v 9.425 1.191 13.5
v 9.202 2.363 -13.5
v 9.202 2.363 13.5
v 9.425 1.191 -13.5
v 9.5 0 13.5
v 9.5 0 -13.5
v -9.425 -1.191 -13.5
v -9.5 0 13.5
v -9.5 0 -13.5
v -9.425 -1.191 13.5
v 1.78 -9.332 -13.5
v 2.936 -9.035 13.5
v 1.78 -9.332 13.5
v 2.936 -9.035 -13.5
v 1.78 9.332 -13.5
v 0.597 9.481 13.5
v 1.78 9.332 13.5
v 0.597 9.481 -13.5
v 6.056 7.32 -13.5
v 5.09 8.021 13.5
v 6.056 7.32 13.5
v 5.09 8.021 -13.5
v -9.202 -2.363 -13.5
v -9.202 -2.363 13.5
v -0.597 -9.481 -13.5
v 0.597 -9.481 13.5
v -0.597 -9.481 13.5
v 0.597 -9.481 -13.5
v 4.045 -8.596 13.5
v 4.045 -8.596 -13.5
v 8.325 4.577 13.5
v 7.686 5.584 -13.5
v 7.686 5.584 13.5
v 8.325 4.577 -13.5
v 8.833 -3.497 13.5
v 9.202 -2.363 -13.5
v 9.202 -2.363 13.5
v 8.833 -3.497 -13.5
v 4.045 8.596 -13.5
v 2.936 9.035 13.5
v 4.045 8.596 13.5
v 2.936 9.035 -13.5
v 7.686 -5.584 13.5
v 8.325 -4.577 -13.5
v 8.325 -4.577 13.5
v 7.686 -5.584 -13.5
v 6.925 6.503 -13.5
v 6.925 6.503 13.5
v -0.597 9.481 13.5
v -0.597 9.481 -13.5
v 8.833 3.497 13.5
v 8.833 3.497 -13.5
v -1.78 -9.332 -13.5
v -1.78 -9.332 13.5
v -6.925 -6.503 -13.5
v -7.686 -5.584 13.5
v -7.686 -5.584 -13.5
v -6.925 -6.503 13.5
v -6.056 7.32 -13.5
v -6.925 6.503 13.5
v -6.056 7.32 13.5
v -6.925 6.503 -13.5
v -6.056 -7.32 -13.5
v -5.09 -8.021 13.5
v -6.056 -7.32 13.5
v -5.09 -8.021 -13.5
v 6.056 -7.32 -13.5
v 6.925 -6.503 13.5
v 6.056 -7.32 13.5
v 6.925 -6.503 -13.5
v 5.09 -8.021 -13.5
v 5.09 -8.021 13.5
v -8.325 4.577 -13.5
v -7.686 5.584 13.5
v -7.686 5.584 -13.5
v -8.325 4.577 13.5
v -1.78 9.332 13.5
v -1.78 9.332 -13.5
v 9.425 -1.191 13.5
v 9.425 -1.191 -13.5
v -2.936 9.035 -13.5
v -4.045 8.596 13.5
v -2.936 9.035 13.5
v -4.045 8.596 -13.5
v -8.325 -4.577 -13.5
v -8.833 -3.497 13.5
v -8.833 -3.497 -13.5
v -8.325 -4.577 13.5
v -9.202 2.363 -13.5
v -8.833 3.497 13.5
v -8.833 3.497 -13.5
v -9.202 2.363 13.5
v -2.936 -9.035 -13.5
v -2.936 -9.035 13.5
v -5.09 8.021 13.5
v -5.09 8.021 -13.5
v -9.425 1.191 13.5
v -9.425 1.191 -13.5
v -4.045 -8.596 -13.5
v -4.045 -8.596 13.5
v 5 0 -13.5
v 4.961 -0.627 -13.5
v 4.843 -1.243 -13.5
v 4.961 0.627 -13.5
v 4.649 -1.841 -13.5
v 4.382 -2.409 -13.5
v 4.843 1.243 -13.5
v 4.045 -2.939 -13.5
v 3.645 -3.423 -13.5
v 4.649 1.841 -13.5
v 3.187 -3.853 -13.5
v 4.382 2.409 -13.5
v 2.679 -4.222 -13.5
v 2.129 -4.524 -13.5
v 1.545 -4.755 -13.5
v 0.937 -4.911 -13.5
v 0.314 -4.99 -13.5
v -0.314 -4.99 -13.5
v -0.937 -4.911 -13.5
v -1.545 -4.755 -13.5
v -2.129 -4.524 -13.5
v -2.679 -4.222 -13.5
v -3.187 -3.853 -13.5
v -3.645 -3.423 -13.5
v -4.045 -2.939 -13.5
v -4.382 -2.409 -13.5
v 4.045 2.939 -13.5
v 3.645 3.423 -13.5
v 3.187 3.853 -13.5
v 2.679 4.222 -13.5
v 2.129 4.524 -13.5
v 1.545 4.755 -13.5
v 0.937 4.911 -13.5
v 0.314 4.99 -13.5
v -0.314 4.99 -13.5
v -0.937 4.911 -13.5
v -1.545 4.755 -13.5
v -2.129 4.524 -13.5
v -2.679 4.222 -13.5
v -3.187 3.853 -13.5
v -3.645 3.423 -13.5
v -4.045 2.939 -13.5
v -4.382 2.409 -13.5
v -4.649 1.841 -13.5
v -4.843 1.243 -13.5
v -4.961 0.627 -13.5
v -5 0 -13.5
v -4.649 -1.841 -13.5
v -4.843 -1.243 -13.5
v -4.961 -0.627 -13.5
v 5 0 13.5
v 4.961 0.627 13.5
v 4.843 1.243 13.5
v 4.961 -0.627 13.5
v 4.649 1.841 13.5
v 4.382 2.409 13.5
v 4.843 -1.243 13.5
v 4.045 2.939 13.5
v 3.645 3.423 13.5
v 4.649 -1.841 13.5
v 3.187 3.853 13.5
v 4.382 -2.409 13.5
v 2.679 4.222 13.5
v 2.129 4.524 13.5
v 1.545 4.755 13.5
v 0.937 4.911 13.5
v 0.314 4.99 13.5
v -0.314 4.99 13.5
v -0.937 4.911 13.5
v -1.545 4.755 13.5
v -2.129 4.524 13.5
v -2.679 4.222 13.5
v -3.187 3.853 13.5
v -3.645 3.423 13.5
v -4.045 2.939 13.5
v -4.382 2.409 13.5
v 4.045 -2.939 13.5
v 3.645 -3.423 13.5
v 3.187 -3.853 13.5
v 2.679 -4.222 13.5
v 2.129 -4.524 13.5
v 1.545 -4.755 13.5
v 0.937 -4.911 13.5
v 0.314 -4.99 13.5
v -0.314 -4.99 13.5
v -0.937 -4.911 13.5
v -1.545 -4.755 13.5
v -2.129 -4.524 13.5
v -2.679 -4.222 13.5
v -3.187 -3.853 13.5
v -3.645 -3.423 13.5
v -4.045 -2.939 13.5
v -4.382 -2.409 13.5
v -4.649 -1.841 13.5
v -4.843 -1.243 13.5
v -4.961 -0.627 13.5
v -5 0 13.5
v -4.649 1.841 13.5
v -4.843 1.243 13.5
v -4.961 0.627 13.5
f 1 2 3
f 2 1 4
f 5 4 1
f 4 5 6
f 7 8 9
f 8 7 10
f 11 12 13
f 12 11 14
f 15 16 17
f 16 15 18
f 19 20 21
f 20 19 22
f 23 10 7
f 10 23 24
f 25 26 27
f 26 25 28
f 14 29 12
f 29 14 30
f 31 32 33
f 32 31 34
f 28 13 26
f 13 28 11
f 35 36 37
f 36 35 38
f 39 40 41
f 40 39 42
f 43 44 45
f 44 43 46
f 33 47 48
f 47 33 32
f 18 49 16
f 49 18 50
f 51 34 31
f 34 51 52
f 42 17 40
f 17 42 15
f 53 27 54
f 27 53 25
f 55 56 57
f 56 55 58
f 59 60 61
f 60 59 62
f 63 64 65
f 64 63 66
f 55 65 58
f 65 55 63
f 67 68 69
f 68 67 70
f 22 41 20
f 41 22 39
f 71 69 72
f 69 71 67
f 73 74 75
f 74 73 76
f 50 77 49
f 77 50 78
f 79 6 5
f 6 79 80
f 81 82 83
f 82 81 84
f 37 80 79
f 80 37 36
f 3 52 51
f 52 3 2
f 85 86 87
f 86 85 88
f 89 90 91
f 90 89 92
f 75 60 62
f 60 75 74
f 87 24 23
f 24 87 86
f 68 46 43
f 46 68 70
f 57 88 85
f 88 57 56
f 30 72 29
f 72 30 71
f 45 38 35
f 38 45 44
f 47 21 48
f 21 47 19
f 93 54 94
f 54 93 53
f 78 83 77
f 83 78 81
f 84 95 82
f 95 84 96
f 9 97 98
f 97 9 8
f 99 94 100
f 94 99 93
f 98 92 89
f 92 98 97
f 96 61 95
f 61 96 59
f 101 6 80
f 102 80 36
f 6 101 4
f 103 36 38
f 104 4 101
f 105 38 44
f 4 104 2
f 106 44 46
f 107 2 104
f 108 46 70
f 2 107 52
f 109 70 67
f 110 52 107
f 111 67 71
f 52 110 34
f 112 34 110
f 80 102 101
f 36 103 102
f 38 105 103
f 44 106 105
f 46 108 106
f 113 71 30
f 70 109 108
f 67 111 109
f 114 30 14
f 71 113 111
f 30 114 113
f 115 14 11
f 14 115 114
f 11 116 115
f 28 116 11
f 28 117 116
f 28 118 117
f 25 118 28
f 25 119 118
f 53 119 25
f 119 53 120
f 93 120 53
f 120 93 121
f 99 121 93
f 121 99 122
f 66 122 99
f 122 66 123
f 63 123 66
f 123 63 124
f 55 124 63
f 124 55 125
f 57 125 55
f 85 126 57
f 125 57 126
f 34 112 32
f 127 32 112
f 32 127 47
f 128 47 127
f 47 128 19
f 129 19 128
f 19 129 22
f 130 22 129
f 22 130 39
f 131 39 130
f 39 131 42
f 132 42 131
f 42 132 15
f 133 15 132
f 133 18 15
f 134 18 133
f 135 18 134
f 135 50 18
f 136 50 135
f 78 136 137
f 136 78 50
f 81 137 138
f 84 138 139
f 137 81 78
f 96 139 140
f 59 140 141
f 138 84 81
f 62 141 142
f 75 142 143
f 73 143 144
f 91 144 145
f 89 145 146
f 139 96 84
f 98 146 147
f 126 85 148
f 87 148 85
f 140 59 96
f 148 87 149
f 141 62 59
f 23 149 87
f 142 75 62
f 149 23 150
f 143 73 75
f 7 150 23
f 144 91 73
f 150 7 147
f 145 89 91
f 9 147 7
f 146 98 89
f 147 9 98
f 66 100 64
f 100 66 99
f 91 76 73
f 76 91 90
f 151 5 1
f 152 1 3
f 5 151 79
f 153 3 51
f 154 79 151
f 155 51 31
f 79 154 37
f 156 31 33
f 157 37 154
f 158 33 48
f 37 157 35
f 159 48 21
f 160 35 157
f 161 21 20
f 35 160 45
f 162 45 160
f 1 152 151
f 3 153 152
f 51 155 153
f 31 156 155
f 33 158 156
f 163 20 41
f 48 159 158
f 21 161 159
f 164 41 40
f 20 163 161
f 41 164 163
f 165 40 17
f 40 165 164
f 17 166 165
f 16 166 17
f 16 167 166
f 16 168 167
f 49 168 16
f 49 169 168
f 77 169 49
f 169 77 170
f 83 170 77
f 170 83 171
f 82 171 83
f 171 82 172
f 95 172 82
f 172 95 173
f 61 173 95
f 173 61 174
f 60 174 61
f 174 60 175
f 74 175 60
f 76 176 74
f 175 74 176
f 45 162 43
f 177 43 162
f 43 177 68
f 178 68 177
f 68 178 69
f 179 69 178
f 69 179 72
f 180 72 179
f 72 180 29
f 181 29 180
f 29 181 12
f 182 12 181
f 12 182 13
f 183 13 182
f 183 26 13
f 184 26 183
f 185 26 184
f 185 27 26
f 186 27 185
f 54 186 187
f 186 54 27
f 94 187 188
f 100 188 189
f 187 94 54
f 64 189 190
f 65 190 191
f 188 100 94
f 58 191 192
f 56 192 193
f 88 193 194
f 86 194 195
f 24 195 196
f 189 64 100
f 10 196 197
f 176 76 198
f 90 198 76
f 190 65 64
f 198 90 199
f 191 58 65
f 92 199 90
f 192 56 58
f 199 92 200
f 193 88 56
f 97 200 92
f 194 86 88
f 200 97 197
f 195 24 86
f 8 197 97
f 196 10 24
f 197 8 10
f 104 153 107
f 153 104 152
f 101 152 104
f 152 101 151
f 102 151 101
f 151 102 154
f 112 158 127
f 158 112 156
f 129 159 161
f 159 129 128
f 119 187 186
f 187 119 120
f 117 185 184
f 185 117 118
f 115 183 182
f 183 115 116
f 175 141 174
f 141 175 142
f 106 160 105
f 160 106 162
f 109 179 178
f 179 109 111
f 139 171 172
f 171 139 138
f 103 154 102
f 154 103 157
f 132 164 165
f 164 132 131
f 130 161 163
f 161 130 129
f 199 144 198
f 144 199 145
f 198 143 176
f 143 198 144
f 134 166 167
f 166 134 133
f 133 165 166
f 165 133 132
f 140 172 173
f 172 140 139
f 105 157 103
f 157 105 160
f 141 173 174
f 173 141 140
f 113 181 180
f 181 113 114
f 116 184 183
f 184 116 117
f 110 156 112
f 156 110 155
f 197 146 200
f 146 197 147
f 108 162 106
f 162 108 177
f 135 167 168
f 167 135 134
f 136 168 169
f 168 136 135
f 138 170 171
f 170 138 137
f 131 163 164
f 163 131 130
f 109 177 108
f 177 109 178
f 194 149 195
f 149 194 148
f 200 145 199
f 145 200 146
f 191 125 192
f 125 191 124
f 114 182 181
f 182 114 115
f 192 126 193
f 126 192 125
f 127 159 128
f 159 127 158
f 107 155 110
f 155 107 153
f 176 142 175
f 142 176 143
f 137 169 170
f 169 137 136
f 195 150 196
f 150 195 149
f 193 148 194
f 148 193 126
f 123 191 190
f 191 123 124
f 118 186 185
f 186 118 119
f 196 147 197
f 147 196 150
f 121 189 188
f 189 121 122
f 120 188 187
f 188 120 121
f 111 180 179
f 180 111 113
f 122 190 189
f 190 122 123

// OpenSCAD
$fn = 50;


difference() {
	union() {
		translate(v = [0, 0, -13.5000000000]) {
			cylinder(h = 27, r = 9.5000000000);
		}
	}
	union() {
		translate(v = [0, 0, -100.0000000000]) {
			cylinder(h = 200, r = 5.0000000000);
		}
	}
}
